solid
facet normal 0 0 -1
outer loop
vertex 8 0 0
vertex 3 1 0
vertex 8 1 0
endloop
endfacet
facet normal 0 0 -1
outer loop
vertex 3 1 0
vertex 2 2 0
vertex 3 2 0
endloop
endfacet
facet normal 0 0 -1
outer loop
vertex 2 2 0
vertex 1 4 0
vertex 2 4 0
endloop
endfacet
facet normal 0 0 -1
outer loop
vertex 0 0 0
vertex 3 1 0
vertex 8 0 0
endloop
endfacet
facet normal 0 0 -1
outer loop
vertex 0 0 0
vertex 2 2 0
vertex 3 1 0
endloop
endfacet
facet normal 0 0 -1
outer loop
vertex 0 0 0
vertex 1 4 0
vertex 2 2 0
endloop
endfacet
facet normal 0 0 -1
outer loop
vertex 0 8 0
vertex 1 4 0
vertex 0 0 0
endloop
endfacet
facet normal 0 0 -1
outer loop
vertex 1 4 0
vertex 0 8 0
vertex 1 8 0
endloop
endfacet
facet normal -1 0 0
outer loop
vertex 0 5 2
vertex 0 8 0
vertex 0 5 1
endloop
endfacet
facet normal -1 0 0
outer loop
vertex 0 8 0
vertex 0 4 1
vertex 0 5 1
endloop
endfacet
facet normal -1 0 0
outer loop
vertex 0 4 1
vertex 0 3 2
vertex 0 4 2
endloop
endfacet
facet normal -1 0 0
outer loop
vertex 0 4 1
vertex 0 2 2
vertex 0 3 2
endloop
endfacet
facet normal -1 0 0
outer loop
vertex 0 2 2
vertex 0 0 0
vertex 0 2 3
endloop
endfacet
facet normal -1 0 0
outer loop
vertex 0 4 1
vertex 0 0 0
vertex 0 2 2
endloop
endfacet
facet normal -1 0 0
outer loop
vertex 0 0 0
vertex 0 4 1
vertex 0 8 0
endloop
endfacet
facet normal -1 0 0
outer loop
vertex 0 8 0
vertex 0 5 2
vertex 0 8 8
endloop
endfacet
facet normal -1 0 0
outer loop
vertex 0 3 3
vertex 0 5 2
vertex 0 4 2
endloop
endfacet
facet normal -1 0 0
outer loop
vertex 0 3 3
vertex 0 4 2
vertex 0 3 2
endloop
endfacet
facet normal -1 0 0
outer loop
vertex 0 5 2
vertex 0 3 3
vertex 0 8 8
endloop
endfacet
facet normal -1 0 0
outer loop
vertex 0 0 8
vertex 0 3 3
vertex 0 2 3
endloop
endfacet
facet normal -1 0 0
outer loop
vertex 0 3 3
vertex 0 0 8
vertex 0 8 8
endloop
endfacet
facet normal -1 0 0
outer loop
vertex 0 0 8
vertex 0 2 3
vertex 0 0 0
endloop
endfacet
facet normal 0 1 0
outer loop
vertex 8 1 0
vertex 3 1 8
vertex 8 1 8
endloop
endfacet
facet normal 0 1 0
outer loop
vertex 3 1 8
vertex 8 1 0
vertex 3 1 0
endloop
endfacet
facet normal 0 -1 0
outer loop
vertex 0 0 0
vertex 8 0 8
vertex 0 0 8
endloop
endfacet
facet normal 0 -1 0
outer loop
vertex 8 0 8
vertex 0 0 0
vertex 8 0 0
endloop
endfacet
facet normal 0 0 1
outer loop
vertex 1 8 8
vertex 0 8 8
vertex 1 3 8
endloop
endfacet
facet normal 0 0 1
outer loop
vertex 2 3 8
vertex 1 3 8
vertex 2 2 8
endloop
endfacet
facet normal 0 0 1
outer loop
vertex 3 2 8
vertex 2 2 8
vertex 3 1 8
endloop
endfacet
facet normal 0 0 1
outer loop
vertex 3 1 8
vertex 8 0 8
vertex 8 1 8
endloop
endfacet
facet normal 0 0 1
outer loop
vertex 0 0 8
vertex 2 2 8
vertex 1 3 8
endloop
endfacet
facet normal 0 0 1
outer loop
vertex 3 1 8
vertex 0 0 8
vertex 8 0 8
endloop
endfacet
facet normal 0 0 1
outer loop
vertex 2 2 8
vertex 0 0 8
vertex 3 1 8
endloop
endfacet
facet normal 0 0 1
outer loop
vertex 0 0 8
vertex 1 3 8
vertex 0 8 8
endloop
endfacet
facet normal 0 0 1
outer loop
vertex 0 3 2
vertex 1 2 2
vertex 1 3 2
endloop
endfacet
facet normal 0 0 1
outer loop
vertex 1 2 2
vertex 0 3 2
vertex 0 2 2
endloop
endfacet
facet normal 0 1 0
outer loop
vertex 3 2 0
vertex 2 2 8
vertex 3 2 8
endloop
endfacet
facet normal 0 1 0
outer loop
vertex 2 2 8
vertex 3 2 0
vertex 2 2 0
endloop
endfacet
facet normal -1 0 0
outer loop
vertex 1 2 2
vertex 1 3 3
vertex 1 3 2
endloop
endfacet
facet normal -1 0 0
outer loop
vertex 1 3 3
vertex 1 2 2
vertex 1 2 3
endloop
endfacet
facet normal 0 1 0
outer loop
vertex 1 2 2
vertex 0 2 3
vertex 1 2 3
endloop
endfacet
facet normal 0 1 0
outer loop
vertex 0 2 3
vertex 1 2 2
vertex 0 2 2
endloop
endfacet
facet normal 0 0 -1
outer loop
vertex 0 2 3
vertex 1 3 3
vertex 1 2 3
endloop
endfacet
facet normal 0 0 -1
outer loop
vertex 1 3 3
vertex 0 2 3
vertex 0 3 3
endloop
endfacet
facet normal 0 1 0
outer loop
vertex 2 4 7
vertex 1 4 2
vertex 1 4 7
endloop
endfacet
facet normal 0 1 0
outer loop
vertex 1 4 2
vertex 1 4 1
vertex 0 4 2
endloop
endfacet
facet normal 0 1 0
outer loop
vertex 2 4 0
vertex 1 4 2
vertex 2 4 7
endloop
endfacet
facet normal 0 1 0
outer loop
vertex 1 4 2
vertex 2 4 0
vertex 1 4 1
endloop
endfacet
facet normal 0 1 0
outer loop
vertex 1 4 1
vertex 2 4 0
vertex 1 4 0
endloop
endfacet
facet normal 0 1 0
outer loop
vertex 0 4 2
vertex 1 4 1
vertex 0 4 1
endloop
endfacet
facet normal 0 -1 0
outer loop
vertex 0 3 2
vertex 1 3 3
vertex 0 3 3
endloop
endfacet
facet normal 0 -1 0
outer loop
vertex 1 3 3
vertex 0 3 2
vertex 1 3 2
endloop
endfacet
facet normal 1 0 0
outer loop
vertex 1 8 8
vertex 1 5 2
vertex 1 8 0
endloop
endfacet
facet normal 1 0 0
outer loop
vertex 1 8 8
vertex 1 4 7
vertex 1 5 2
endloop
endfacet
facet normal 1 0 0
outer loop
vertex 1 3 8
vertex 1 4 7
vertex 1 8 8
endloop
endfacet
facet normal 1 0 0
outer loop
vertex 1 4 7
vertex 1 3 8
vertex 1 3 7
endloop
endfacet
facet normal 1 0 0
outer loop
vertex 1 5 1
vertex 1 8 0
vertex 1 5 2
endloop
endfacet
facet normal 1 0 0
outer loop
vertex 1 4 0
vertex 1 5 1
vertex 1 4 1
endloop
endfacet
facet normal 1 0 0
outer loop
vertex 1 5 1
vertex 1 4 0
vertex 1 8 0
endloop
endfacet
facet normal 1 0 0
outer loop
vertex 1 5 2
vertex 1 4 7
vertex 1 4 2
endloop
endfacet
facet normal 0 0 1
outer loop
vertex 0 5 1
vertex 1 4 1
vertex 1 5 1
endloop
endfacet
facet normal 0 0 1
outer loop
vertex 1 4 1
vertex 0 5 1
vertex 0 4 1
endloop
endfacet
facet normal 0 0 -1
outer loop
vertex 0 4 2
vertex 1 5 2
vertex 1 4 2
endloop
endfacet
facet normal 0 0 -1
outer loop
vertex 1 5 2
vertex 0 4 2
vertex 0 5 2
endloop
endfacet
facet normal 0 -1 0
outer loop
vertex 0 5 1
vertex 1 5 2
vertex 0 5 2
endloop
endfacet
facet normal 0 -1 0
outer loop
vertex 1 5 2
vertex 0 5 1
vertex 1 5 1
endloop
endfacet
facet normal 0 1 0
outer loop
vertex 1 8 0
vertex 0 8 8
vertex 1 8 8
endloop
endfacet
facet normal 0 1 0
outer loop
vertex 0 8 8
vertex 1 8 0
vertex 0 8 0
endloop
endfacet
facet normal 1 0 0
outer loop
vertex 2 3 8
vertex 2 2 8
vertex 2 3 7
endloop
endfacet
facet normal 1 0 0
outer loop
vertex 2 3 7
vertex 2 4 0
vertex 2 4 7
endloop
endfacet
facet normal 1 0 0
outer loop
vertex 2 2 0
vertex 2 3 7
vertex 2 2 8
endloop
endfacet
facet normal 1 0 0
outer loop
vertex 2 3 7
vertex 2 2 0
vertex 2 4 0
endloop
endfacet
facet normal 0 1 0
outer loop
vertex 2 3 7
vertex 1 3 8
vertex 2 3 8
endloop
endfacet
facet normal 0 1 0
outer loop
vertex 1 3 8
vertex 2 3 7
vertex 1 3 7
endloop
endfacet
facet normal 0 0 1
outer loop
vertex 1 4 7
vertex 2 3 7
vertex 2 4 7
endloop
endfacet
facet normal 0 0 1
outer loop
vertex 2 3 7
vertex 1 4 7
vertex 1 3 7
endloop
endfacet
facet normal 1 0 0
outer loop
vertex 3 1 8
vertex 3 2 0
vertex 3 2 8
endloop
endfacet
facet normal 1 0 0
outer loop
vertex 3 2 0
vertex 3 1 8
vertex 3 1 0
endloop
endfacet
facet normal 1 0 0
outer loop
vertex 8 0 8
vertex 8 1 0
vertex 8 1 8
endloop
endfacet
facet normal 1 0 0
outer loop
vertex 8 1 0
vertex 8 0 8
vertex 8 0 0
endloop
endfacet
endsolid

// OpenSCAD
union() {
    translate([0, 0, 0]) cube([1, 1, 1]);
    translate([0, 0, 1]) cube([1, 1, 1]);
    translate([0, 0, 2]) cube([1, 1, 1]);
    translate([0, 0, 3]) cube([1, 1, 1]);
    translate([0, 0, 4]) cube([1, 1, 1]);
    translate([0, 0, 5]) cube([1, 1, 1]);
    translate([0, 0, 6]) cube([1, 1, 1]);
    translate([0, 0, 7]) cube([1, 1, 1]);
    translate([0, 1, 0]) cube([1, 1, 1]);
    translate([0, 1, 1]) cube([1, 1, 1]);
    translate([0, 1, 2]) cube([1, 1, 1]);
    translate([0, 1, 3]) cube([1, 1, 1]);
    translate([0, 1, 4]) cube([1, 1, 1]);
    translate([0, 1, 5]) cube([1, 1, 1]);
    translate([0, 1, 6]) cube([1, 1, 1]);
    translate([0, 1, 7]) cube([1, 1, 1]);
    translate([0, 2, 0]) cube([1, 1, 1]);
    translate([0, 2, 1]) cube([1, 1, 1]);
    translate([0, 2, 3]) cube([1, 1, 1]);
    translate([0, 2, 4]) cube([1, 1, 1]);
    translate([0, 2, 5]) cube([1, 1, 1]);
    translate([0, 2, 6]) cube([1, 1, 1]);
    translate([0, 2, 7]) cube([1, 1, 1]);
    translate([0, 3, 0]) cube([1, 1, 1]);
    translate([0, 3, 1]) cube([1, 1, 1]);
    translate([0, 3, 2]) cube([1, 1, 1]);
    translate([0, 3, 3]) cube([1, 1, 1]);
    translate([0, 3, 4]) cube([1, 1, 1]);
    translate([0, 3, 5]) cube([1, 1, 1]);
    translate([0, 3, 6]) cube([1, 1, 1]);
    translate([0, 3, 7]) cube([1, 1, 1]);
    translate([0, 4, 0]) cube([1, 1, 1]);
    translate([0, 4, 2]) cube([1, 1, 1]);
    translate([0, 4, 3]) cube([1, 1, 1]);
    translate([0, 4, 4]) cube([1, 1, 1]);
    translate([0, 4, 5]) cube([1, 1, 1]);
    translate([0, 4, 6]) cube([1, 1, 1]);
    translate([0, 4, 7]) cube([1, 1, 1]);
    translate([0, 5, 0]) cube([1, 1, 1]);
    translate([0, 5, 1]) cube([1, 1, 1]);
    translate([0, 5, 2]) cube([1, 1, 1]);
    translate([0, 5, 3]) cube([1, 1, 1]);
    translate([0, 5, 4]) cube([1, 1, 1]);
    translate([0, 5, 5]) cube([1, 1, 1]);
    translate([0, 5, 6]) cube([1, 1, 1]);
    translate([0, 5, 7]) cube([1, 1, 1]);
    translate([0, 6, 0]) cube([1, 1, 1]);
    translate([0, 6, 1]) cube([1, 1, 1]);
    translate([0, 6, 2]) cube([1, 1, 1]);
    translate([0, 6, 3]) cube([1, 1, 1]);
    translate([0, 6, 4]) cube([1, 1, 1]);
    translate([0, 6, 5]) cube([1, 1, 1]);
    translate([0, 6, 6]) cube([1, 1, 1]);
    translate([0, 6, 7]) cube([1, 1, 1]);
    translate([0, 7, 0]) cube([1, 1, 1]);
    translate([0, 7, 1]) cube([1, 1, 1]);
    translate([0, 7, 2]) cube([1, 1, 1]);
    translate([0, 7, 3]) cube([1, 1, 1]);
    translate([0, 7, 4]) cube([1, 1, 1]);
    translate([0, 7, 5]) cube([1, 1, 1]);
    translate([0, 7, 6]) cube([1, 1, 1]);
    translate([0, 7, 7]) cube([1, 1, 1]);
    translate([1, 0, 0]) cube([1, 1, 1]);
    translate([1, 0, 1]) cube([1, 1, 1]);
    translate([1, 0, 2]) cube([1, 1, 1]);
    translate([1, 0, 3]) cube([1, 1, 1]);
    translate([1, 0, 4]) cube([1, 1, 1]);
    translate([1, 0, 5]) cube([1, 1, 1]);
    translate([1, 0, 6]) cube([1, 1, 1]);
    translate([1, 0, 7]) cube([1, 1, 1]);
    translate([1, 1, 0]) cube([1, 1, 1]);
    translate([1, 1, 1]) cube([1, 1, 1]);
    translate([1, 1, 2]) cube([1, 1, 1]);
    translate([1, 1, 3]) cube([1, 1, 1]);
    translate([1, 1, 4]) cube([1, 1, 1]);
    translate([1, 1, 5]) cube([1, 1, 1]);
    translate([1, 1, 6]) cube([1, 1, 1]);
    translate([1, 1, 7]) cube([1, 1, 1]);
    translate([1, 2, 0]) cube([1, 1, 1]);
    translate([1, 2, 1]) cube([1, 1, 1]);
    translate([1, 2, 2]) cube([1, 1, 1]);
    translate([1, 2, 3]) cube([1, 1, 1]);
    translate([1, 2, 4]) cube([1, 1, 1]);
    translate([1, 2, 5]) cube([1, 1, 1]);
    translate([1, 2, 6]) cube([1, 1, 1]);
    translate([1, 2, 7]) cube([1, 1, 1]);
    translate([1, 3, 0]) cube([1, 1, 1]);
    translate([1, 3, 1]) cube([1, 1, 1]);
    translate([1, 3, 2]) cube([1, 1, 1]);
    translate([1, 3, 3]) cube([1, 1, 1]);
    translate([1, 3, 4]) cube([1, 1, 1]);
    translate([1, 3, 5]) cube([1, 1, 1]);
    translate([1, 3, 6]) cube([1, 1, 1]);
    translate([2, 0, 0]) cube([1, 1, 1]);
    translate([2, 0, 1]) cube([1, 1, 1]);
    translate([2, 0, 2]) cube([1, 1, 1]);
    translate([2, 0, 3]) cube([1, 1, 1]);
    translate([2, 0, 4]) cube([1, 1, 1]);
    translate([2, 0, 5]) cube([1, 1, 1]);
    translate([2, 0, 6]) cube([1, 1, 1]);
    translate([2, 0, 7]) cube([1, 1, 1]);
    translate([2, 1, 0]) cube([1, 1, 1]);
    translate([2, 1, 1]) cube([1, 1, 1]);
    translate([2, 1, 2]) cube([1, 1, 1]);
    translate([2, 1, 3]) cube([1, 1, 1]);
    translate([2, 1, 4]) cube([1, 1, 1]);
    translate([2, 1, 5]) cube([1, 1, 1]);
    translate([2, 1, 6]) cube([1, 1, 1]);
    translate([2, 1, 7]) cube([1, 1, 1]);
    translate([3, 0, 0]) cube([1, 1, 1]);
    translate([3, 0, 1]) cube([1, 1, 1]);
    translate([3, 0, 2]) cube([1, 1, 1]);
    translate([3, 0, 3]) cube([1, 1, 1]);
    translate([3, 0, 4]) cube([1, 1, 1]);
    translate([3, 0, 5]) cube([1, 1, 1]);
    translate([3, 0, 6]) cube([1, 1, 1]);
    translate([3, 0, 7]) cube([1, 1, 1]);
    translate([4, 0, 0]) cube([1, 1, 1]);
    translate([4, 0, 1]) cube([1, 1, 1]);
    translate([4, 0, 2]) cube([1, 1, 1]);
    translate([4, 0, 3]) cube([1, 1, 1]);
    translate([4, 0, 4]) cube([1, 1, 1]);
    translate([4, 0, 5]) cube([1, 1, 1]);
    translate([4, 0, 6]) cube([1, 1, 1]);
    translate([4, 0, 7]) cube([1, 1, 1]);
    translate([5, 0, 0]) cube([1, 1, 1]);
    translate([5, 0, 1]) cube([1, 1, 1]);
    translate([5, 0, 2]) cube([1, 1, 1]);
    translate([5, 0, 3]) cube([1, 1, 1]);
    translate([5, 0, 4]) cube([1, 1, 1]);
    translate([5, 0, 5]) cube([1, 1, 1]);
    translate([5, 0, 6]) cube([1, 1, 1]);
    translate([5, 0, 7]) cube([1, 1, 1]);
    translate([6, 0, 0]) cube([1, 1, 1]);
    translate([6, 0, 1]) cube([1, 1, 1]);
    translate([6, 0, 2]) cube([1, 1, 1]);
    translate([6, 0, 3]) cube([1, 1, 1]);
    translate([6, 0, 4]) cube([1, 1, 1]);
    translate([6, 0, 5]) cube([1, 1, 1]);
    translate([6, 0, 6]) cube([1, 1, 1]);
    translate([6, 0, 7]) cube([1, 1, 1]);
    translate([7, 0, 0]) cube([1, 1, 1]);
    translate([7, 0, 1]) cube([1, 1, 1]);
    translate([7, 0, 2]) cube([1, 1, 1]);
    translate([7, 0, 3]) cube([1, 1, 1]);
    translate([7, 0, 4]) cube([1, 1, 1]);
    translate([7, 0, 5]) cube([1, 1, 1]);
    translate([7, 0, 6]) cube([1, 1, 1]);
    translate([7, 0, 7]) cube([1, 1, 1]);
}
